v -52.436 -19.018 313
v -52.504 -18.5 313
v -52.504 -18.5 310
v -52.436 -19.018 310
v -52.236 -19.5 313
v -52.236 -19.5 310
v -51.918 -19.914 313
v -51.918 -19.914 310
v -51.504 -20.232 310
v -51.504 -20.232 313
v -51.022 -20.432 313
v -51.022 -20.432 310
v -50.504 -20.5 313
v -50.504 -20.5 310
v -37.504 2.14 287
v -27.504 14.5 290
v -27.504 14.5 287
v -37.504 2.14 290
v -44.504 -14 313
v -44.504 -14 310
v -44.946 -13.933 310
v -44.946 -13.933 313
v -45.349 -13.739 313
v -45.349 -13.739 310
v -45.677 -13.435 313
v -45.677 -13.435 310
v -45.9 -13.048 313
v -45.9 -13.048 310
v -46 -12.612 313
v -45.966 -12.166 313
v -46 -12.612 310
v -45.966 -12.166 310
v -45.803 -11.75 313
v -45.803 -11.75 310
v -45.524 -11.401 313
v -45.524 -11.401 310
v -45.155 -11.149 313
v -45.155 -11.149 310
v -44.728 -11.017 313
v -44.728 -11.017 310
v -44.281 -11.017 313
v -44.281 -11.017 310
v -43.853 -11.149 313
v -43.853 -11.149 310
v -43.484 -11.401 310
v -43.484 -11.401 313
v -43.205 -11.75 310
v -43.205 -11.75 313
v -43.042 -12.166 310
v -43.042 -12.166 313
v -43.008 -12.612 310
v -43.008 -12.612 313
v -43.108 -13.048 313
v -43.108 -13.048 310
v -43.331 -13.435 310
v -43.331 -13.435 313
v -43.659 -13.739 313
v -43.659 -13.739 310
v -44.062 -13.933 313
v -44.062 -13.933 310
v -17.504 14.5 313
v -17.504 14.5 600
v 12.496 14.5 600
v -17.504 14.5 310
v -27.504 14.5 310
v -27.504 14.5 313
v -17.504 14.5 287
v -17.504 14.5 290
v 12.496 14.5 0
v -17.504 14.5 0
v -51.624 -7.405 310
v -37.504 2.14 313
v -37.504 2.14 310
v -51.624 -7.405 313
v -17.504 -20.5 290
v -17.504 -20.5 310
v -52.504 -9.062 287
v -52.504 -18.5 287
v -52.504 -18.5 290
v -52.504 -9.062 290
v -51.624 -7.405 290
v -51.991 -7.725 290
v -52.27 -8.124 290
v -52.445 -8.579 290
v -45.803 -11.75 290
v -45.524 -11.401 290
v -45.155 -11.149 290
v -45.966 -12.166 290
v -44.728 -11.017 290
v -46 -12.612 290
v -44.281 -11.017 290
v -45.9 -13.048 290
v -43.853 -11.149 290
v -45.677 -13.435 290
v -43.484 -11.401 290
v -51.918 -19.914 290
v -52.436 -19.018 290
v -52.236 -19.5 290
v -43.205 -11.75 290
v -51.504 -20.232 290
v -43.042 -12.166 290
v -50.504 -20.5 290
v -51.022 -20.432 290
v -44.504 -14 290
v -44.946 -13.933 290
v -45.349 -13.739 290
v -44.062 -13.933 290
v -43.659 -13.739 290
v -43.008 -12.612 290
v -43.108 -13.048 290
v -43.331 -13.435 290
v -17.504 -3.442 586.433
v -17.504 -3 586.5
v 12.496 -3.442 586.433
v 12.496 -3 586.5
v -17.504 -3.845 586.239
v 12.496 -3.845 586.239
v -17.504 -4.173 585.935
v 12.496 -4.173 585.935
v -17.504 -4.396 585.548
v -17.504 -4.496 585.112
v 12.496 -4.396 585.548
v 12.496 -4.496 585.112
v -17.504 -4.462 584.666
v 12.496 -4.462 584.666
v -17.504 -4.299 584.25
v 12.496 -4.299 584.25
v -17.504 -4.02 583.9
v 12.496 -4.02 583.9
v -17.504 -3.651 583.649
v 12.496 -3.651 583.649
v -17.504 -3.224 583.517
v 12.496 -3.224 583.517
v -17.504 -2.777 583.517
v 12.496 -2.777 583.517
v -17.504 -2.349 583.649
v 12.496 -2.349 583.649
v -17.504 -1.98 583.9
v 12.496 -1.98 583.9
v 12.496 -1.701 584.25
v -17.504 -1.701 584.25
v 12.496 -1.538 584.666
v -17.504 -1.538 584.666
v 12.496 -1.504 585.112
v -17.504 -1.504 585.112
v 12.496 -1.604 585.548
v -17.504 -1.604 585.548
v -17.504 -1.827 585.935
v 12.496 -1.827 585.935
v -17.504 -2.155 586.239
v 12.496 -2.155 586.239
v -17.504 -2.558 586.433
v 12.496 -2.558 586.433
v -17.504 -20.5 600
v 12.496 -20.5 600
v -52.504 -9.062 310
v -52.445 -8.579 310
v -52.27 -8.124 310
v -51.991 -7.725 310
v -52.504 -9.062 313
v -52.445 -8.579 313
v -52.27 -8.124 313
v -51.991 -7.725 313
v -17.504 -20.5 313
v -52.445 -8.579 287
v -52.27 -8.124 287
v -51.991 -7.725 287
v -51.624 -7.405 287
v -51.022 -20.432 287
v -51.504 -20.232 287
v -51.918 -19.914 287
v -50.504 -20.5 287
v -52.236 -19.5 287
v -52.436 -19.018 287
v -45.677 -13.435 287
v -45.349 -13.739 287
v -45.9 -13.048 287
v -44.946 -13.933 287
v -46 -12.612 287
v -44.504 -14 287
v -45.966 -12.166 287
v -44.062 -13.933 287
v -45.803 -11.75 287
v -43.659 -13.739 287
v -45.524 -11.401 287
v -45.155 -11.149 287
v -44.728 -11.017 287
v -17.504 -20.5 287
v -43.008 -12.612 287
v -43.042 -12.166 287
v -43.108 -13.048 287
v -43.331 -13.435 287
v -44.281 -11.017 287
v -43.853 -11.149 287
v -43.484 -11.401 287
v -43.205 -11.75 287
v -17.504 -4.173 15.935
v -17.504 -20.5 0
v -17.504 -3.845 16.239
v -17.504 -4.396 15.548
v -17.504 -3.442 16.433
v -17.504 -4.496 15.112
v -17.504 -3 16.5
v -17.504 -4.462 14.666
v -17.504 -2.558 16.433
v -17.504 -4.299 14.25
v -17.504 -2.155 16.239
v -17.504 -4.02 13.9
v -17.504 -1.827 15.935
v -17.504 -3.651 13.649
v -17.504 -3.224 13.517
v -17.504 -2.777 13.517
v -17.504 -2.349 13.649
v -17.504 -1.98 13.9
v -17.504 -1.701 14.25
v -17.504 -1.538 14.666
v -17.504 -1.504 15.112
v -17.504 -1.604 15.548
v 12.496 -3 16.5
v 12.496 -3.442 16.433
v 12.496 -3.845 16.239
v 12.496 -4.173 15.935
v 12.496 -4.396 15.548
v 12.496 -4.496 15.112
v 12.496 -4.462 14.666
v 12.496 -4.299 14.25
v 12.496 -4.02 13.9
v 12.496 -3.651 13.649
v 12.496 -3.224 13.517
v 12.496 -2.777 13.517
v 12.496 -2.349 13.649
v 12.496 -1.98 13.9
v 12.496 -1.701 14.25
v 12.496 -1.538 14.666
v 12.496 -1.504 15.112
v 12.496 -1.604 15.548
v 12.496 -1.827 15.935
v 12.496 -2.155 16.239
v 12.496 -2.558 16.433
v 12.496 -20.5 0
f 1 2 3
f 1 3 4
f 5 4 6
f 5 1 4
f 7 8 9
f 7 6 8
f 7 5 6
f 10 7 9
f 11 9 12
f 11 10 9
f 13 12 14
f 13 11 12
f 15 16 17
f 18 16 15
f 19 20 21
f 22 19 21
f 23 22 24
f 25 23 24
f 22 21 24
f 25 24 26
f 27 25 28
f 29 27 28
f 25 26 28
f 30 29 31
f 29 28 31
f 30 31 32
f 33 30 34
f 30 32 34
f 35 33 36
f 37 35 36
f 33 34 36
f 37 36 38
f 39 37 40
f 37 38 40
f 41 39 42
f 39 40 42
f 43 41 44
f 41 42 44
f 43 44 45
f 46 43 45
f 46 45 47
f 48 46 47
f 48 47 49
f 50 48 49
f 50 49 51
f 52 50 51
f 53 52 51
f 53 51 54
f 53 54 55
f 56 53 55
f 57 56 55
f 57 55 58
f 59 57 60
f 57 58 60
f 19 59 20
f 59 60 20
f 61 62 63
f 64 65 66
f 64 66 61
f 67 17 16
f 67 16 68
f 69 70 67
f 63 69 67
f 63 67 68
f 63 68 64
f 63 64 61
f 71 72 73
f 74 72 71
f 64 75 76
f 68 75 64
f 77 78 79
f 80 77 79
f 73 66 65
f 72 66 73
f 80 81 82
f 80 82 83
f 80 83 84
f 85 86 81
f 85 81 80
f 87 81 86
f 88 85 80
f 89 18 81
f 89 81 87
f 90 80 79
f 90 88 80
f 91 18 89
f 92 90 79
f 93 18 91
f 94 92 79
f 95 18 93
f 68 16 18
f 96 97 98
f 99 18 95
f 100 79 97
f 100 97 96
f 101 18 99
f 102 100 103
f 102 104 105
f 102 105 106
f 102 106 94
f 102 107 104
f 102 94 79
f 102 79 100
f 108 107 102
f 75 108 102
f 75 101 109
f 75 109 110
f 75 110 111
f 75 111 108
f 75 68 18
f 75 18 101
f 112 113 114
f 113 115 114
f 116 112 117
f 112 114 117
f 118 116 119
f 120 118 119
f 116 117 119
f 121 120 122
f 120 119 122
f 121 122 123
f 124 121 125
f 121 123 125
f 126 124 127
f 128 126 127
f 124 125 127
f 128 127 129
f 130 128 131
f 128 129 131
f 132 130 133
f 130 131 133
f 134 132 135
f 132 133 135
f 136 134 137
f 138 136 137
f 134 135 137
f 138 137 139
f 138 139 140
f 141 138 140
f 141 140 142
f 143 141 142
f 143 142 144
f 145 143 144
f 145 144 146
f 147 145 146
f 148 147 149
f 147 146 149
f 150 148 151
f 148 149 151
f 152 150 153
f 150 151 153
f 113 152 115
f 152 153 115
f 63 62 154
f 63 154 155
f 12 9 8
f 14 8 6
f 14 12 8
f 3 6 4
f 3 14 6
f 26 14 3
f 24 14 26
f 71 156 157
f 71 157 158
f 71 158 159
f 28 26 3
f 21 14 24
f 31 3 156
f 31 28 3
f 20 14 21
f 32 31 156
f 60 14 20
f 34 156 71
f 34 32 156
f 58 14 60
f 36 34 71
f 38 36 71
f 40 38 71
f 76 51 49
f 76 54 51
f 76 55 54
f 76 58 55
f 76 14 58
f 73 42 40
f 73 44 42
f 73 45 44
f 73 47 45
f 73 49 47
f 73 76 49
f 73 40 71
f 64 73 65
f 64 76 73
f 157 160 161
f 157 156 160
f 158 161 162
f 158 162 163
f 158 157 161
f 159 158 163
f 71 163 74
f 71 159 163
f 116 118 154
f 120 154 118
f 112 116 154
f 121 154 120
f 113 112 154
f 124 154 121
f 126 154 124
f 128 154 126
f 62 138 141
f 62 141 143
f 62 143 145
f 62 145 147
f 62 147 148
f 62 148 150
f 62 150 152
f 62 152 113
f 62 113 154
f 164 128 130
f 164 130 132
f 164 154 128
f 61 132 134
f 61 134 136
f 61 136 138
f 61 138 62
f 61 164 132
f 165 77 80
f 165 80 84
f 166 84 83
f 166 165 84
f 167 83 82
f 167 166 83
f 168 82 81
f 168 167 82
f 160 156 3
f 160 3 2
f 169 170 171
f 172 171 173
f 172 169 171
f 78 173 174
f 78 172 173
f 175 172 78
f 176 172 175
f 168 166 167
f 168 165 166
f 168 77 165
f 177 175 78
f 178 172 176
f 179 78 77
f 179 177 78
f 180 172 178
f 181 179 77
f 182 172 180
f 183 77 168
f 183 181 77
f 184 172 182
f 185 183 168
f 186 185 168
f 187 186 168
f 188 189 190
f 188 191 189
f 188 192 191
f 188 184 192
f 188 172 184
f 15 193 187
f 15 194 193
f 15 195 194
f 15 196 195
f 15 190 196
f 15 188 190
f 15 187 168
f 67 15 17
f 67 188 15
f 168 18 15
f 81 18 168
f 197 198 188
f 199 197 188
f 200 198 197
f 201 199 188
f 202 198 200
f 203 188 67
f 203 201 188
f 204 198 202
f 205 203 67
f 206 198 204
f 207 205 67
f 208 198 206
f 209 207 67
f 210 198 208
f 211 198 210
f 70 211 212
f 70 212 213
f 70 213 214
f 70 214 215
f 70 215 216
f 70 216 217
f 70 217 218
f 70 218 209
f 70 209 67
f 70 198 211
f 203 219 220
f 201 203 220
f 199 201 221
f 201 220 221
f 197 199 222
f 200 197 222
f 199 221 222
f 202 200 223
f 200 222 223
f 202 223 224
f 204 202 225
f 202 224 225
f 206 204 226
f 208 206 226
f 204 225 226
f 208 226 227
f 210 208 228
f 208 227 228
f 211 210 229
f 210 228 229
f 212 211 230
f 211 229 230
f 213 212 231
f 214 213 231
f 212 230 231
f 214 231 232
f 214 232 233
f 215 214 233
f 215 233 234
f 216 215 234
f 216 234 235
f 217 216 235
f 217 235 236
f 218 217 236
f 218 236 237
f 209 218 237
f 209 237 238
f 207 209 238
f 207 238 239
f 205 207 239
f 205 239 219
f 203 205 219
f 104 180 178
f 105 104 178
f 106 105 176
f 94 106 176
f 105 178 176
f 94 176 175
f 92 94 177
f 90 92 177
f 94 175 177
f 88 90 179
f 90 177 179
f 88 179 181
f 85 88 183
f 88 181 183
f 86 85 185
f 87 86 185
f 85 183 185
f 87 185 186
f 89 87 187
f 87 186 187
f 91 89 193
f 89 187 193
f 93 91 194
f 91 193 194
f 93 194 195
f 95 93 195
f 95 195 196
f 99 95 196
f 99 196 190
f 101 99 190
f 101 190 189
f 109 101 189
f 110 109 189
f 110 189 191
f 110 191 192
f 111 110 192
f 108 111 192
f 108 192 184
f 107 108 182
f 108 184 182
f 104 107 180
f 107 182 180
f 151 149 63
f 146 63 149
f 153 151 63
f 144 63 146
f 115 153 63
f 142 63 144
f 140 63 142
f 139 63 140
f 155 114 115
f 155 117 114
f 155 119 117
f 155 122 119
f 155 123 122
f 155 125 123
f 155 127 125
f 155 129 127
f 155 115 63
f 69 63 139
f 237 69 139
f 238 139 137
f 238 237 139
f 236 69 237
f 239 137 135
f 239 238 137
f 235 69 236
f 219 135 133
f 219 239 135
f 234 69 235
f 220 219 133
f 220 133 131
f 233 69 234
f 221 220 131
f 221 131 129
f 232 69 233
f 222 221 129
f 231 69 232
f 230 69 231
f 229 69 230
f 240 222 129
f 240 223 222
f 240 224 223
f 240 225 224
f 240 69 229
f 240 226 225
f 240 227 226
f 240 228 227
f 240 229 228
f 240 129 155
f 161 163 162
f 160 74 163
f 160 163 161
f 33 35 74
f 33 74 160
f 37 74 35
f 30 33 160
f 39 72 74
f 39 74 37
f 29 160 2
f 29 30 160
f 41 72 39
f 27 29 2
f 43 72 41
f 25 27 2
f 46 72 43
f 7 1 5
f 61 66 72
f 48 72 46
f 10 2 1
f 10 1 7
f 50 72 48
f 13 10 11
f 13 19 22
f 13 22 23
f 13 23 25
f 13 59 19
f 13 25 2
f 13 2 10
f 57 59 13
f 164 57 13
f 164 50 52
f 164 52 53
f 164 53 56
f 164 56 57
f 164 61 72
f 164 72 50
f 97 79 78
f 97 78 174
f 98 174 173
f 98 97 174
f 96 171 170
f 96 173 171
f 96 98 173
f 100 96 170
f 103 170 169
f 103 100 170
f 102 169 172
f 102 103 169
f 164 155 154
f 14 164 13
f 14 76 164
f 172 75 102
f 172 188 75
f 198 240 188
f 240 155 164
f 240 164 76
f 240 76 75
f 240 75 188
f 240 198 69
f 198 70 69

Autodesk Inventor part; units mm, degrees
ref_plane "YZ Plane" through (0, 0, 0) normal (1, 0, 0) x (0, 1, 0)
ref_plane "XZ Plane" through (0, 0, 0) normal (0, 1, 0) x (-1, 0, 0)
ref_plane "XY Plane" through (0, 0, 0) normal (0, 0, 1) x (1, 0, 0)
sketch "Skizze1" plane through (0, 0, 0) normal (0, 0, 1) x (1, 0, 0)
  line L0 (-65.5041, 0) -> (25.4959, 0) projected
  line L1 (0, -27.5001) -> (0, 21.4999) projected
  line L2 (-17.5041, 14.4999) -> (12.4959, 14.4999)
  line L3 (12.4959, 14.4999) -> (12.4959, -20.5001)
  line L4 (12.4959, -20.5001) -> (-17.5041, -20.5001)
  line L5 (-17.5041, -20.5001) -> (-17.5041, 14.4999)
  point P0 (0, 0)
  dimension "d0" = 30
  dimension "d1" = 35
extrude "Extrusion1" add sketch "Skizze1" along normal blind 600
sketch "Skizze2" plane through (-17.5041, -20.5001, 0) normal (-1, 0, 0) x (0, 0, 1)
  line L0 (0, 0) -> (600, 0) projected
  line L1 (287, 35) -> (290, 35)
  line L2 (290, 35) -> (290, 0)
  line L3 (290, 0) -> (287, 0)
  line L4 (287, 0) -> (287, 35)
  line L5 (0, 35) -> (600, 35) projected
  line L6 (310, 35) -> (313, 35)
  line L7 (313, 35) -> (313, 0)
  line L8 (313, 0) -> (310, 0)
  line L9 (310, 0) -> (310, 35)
  line L10 (600, 35) -> (600, 0) projected
  point P0 (0, 20.5001)
  point P1 (310, 0)
  point P2 (313, 0)
  point P3 (287, 0)
  dimension "d4" = 287
  dimension "d5" = 3
  dimension "d6" = 20
  dimension "d7" = 3
  dimension "d10" = 35
extrude "Extrusion2" add sketch "Skizze2" along normal blind 35 contours L4 L1 L2 L0 | L9 L5 L7 L0
sketch "Skizze3" plane through (-17.5041, -20.5001, 313) normal (0, 0, 1) x (1, 0, 0)
  line L0 (0, 35) -> (-35, 35) projected
  line L1 (-10, 35) -> (-20, 22.6396)
  line L2 (-20, 22.6396) -> (-35, 12.5)
  line L3 (-35, 12.5) -> (-35, 35)
  line L4 (-35, 35) -> (-10, 35)
  point P0 (17.5041, 20.5001)
  dimension "d11" = 25
  dimension "d12" = 15
  dimension "d13" = 22.5
extrude "Extrusion3" cut sketch "Skizze3" against normal blind 50
fillet "Rundung1" radius 2 4 edges at (-52.5041, -8.0001, 288.5) (-52.5041, -8.0001, 311.5) (-52.5041, -20.5001, 288.5) (-52.5041, -20.5001, 311.5)
sketch "Skizze4" plane through (-17.5041, -20.5001, 313) normal (0, 0, 1) x (1, 0, 0)
  line L0 (-35, 2) -> (-35, 11.4379) projected
  line L1 (0, 0) -> (-33, 0) projected
  point P0 (17.5041, 20.5001)
  point P1 (-27, 8)
  dimension "d17" = 8
  dimension "d18" = 8
hole "Bohrung1" at (-44.5041, -12.5001, 313) direction (0, 0, -1) diameter 3 end through all
sketch "Skizze5" plane through (-17.5041, -20.5001, 600) normal (-1, 0, 0) x (0, 0, 1)
  line L0 (0, 35) -> (0, 0) projected
  line L1 (-600, 35) -> (-600, 0) projected
  line L2 (-600, 35) -> (-313, 35) projected
  line L3 (-287, 35) -> (0, 35) projected
  point P0 (-600, 20.5001)
  point P1 (-585, 17.5)
  point P2 (-15, 17.5)
  dimension "d26" = 15
  dimension "d27" = 15
  dimension "d28" = 17.5
  dimension "d29" = 17.5
hole "Bohrung2" at (-17.5041, -3.0001, 15) at (-17.5041, -3.0001, 585) direction (1, 0, 0) diameter 3 depth 30 tip angle 118
properties part number "träger hinten mit motorhalterung" material "Stahl"
